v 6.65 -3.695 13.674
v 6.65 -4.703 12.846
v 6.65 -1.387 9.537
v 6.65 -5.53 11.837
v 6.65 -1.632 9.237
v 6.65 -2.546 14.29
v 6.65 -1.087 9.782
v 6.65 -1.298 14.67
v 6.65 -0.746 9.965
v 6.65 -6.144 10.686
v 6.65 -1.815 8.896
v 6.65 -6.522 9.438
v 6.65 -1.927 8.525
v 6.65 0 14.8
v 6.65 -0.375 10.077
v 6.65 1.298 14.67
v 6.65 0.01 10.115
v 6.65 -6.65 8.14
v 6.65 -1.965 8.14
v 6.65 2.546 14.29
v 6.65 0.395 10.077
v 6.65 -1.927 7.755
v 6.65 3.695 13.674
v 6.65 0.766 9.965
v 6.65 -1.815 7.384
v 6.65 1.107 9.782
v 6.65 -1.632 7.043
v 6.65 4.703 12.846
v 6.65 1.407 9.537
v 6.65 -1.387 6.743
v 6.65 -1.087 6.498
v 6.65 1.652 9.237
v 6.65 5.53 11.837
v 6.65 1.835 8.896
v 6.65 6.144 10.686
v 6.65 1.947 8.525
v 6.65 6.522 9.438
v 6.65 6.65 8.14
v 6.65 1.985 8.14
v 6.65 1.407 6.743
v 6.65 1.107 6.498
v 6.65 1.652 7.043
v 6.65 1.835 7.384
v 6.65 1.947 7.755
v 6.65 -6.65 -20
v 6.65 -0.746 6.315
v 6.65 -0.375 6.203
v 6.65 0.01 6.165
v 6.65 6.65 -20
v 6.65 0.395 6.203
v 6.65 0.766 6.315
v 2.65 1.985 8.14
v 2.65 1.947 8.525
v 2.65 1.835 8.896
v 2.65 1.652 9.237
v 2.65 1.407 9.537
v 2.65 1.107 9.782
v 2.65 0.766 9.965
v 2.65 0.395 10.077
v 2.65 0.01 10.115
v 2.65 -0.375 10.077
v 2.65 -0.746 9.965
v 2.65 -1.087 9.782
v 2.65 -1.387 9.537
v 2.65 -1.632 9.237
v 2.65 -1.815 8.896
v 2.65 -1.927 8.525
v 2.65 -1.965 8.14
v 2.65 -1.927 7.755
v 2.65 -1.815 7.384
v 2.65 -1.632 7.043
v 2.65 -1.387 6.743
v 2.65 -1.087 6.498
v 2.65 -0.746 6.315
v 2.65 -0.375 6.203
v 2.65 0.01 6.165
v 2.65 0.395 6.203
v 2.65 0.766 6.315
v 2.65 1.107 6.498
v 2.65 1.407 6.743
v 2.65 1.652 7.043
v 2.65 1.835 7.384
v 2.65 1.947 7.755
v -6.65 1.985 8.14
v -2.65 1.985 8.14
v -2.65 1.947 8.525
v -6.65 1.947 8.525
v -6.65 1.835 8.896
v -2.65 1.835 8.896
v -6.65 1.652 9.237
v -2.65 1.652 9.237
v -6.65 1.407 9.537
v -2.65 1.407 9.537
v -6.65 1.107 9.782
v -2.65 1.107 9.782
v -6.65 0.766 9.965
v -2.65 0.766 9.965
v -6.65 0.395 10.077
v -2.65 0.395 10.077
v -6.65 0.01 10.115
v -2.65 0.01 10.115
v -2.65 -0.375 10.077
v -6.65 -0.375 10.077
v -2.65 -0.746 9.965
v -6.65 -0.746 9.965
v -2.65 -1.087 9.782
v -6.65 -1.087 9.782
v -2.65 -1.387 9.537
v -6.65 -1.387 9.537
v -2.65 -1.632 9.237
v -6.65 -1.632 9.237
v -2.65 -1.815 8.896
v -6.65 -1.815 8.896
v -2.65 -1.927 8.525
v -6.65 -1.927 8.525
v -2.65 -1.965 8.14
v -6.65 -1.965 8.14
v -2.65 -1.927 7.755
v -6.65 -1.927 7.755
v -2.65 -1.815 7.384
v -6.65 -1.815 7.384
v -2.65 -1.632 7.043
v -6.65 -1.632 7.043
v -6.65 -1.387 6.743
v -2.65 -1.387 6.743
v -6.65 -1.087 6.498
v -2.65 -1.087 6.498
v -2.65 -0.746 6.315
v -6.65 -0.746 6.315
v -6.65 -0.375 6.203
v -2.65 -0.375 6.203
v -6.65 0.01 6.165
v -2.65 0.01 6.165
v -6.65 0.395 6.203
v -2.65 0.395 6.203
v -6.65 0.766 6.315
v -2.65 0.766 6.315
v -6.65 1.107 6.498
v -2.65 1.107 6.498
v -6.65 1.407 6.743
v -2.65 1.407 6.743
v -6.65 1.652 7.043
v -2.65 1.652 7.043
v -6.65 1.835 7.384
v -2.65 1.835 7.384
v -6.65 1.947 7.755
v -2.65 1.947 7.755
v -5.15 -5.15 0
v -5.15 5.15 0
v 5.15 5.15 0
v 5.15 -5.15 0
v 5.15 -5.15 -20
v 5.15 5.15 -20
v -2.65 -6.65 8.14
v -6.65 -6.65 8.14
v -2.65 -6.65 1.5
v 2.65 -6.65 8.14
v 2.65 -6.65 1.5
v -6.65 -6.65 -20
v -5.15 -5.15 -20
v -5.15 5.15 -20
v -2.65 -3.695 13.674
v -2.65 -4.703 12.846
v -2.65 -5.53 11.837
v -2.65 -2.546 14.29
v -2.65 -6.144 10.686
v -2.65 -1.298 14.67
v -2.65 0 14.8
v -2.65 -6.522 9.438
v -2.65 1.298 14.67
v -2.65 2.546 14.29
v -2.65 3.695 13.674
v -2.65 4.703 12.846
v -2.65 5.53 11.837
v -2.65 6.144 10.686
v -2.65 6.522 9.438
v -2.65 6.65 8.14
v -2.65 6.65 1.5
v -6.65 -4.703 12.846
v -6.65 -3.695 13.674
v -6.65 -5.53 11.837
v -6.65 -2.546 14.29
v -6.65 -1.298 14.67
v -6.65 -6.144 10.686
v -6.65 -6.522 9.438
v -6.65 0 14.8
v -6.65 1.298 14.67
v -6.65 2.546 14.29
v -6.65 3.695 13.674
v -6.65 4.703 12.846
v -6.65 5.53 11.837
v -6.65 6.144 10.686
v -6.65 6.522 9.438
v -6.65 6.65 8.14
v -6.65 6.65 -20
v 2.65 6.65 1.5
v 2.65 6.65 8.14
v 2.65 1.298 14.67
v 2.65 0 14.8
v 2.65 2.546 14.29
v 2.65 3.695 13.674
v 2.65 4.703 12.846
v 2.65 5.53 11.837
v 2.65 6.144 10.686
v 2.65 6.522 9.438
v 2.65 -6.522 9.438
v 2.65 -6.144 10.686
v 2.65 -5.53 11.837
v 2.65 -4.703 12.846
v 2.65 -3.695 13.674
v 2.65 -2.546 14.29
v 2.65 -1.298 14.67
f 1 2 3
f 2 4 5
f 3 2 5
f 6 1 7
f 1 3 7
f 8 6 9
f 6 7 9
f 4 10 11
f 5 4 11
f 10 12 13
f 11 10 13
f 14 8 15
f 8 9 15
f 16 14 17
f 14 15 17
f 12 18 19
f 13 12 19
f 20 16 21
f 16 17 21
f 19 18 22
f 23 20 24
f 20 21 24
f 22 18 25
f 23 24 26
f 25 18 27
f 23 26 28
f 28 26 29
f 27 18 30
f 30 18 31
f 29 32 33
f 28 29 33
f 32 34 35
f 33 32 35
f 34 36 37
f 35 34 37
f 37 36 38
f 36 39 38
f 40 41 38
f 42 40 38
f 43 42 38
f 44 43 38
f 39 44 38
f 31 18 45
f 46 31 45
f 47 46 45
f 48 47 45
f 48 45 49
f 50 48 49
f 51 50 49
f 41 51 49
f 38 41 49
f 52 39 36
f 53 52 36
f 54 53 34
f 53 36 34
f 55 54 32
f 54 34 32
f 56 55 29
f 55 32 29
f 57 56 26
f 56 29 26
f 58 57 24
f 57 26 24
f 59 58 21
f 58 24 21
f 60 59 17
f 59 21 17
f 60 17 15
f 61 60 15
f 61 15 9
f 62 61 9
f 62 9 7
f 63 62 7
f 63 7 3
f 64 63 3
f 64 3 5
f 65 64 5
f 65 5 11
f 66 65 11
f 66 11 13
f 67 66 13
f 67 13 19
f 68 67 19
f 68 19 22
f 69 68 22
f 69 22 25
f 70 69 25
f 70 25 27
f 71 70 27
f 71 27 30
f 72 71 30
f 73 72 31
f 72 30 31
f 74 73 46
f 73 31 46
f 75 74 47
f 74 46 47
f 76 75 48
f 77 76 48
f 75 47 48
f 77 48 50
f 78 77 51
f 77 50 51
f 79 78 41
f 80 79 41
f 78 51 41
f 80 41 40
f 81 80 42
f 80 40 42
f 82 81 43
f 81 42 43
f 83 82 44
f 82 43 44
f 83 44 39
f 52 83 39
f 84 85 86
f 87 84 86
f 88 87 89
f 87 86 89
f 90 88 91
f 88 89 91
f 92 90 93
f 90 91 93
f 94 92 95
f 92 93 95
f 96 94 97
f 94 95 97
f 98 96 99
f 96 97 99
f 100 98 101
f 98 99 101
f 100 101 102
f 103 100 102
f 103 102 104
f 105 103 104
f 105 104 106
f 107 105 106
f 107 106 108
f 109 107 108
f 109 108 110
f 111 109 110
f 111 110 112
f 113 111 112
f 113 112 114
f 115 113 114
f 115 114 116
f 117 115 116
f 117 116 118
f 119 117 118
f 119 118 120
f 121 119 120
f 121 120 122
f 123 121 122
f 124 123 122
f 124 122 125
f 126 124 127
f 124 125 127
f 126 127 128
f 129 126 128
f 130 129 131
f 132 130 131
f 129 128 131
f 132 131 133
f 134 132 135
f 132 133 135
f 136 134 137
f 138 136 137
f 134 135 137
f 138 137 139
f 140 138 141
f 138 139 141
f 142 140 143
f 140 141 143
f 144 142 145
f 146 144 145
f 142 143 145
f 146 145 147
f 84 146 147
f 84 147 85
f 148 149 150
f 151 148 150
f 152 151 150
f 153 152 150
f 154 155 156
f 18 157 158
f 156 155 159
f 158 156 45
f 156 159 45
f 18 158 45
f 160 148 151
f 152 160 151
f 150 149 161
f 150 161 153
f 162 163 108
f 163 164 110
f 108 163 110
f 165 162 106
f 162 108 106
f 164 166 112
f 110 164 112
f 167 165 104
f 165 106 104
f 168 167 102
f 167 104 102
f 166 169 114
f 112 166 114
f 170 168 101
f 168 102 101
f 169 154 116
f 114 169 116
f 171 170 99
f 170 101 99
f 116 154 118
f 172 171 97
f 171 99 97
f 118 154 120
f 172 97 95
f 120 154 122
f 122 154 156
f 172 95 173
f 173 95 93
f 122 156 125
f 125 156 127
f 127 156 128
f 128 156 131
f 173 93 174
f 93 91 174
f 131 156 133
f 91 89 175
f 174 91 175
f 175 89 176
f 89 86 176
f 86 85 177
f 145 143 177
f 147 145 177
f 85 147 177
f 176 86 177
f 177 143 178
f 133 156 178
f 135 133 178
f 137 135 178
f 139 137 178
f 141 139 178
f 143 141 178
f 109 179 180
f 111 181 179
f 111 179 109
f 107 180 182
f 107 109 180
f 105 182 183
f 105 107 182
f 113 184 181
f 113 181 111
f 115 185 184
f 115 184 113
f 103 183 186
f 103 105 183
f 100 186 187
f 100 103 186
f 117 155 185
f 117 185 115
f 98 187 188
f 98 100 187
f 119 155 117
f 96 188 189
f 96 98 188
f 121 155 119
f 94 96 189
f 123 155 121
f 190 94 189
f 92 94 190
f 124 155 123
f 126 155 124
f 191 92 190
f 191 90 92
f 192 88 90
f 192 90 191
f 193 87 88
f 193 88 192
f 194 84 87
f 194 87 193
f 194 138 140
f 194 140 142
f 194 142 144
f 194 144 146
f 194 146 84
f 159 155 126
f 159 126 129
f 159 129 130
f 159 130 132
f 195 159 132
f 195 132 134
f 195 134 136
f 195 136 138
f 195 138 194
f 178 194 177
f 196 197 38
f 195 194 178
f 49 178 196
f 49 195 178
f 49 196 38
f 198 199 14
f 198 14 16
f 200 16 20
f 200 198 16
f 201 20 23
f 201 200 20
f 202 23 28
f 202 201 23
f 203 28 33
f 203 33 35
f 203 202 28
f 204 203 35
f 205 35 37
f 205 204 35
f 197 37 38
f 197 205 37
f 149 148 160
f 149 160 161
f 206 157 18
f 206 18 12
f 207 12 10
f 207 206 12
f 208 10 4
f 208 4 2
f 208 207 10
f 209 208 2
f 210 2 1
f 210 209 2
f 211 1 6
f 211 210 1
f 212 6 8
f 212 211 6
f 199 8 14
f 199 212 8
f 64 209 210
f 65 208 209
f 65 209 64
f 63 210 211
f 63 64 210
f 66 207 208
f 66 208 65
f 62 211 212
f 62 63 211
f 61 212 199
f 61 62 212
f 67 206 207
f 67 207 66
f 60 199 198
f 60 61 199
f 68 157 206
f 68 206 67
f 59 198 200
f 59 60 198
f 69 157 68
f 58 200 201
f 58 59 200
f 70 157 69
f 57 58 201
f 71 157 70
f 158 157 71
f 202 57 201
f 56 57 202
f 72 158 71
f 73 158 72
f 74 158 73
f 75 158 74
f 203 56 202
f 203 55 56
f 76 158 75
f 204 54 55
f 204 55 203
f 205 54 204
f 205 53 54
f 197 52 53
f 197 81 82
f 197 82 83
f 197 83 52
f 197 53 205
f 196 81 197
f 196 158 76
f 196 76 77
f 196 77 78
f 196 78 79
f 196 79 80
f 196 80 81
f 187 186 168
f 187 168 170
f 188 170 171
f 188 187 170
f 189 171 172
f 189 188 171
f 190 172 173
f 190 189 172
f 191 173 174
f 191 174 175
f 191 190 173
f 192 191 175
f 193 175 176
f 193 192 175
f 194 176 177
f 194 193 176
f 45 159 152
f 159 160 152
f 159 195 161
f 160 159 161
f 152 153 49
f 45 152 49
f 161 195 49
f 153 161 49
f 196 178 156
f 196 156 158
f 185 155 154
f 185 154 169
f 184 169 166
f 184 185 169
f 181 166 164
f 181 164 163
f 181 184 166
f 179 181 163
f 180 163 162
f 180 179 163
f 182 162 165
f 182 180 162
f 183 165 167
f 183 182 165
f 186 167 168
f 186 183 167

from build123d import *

# Parameters (mm, degrees)
F0_W          = 13.3
F0_H          = 13.3
F0_W_2        = 10.3
F0_H_2        = 10.3
F1_DEPTH      = 20
F2_DEPTH      = 1.5
F3_W          = 4
F3_H          = 13.3
F4_DEPTH      = 13.3
F5_T1_DEPTH   = 37.3
F5_T3_DEPTH   = 37.3
F6_R          = 1.975
F7_DEPTH      = 25
F7_DEPTH_BACK = 25


# Not quite as in the source:
# - a fillet or chamfer that OpenCascade refuses, or shapes differently, is made with other operations: its cross-section is extruded or revolved along the edge and cut away or added


with BuildPart() as f1:
    # F0 (on Top) → F1 (new body)
    with BuildSketch(Plane.XY):
        Rectangle(F0_W, F0_H)
        Rectangle(F0_W_2, F0_H_2, mode=Mode.SUBTRACT)
    extrude(amount=-F1_DEPTH)

    # F0 (on Top) → F2 (join)
    with BuildSketch(Plane.XY):
        Rectangle(F0_W, F0_H)
        Rectangle(F0_W_2, F0_H_2, mode=Mode.SUBTRACT)
        Rectangle(F0_W_2, F0_H_2)
    extrude(amount=F2_DEPTH)

    # F3 (on face) → F4 (join)
    with BuildSketch(Plane.XY.offset(1.5)):
        with Locations((-4.65, 0)):
            Rectangle(F3_W, F3_H)
        with Locations((4.65, 0)):
            Rectangle(F3_W, F3_H)
    extrude(amount=F4_DEPTH)

    # F5: fillet of radius 6.66 on 4 edges, made by hand

    # F5_s2 → F5_t1 (cut)
    with BuildSketch(Plane.YZ.offset(-14)):
        with BuildLine():
            ThreePointArc((-0.01, 14.8), (4.6993311627, 12.8493311627), (6.65, 8.14))
            Line((6.65, 8.14), (6.65, 14.8))
            Line((6.65, 14.8), (-0.01, 14.8))
        make_face()
        with BuildLine():
            ThreePointArc((-6.65, 8.14), (-4.6993311627, 12.8493311627), (0.01, 14.8))
            Line((0.01, 14.8), (-6.65, 14.8))
            Line((-6.65, 14.8), (-6.65, 8.14))
        make_face()
    extrude(amount=F5_T1_DEPTH, mode=Mode.SUBTRACT)

    # F5_s4 → F5_t3 (cut)
    with BuildSketch(Plane.YZ.offset(-23.3)):
        with BuildLine():
            ThreePointArc((-0.01, 14.8), (4.6993311627, 12.8493311627), (6.65, 8.14))
            Line((6.65, 8.14), (6.65, 14.8))
            Line((6.65, 14.8), (-0.01, 14.8))
        make_face()
        with BuildLine():
            ThreePointArc((-6.65, 8.14), (-4.6993311627, 12.8493311627), (0.01, 14.8))
            Line((0.01, 14.8), (-6.65, 14.8))
            Line((-6.65, 14.8), (-6.65, 8.14))
        make_face()
    extrude(amount=F5_T3_DEPTH, mode=Mode.SUBTRACT)

    # F6 (on face) → F7 (cut, two sides)
    with BuildSketch(Plane.YZ.offset(6.65)) as f7_sk:
        with Locations((0.01, 8.14)):
            Circle(F6_R)
    extrude(amount=-F7_DEPTH, mode=Mode.SUBTRACT)
    extrude(f7_sk.sketch, amount=F7_DEPTH_BACK, mode=Mode.SUBTRACT)


solid = f1.part
